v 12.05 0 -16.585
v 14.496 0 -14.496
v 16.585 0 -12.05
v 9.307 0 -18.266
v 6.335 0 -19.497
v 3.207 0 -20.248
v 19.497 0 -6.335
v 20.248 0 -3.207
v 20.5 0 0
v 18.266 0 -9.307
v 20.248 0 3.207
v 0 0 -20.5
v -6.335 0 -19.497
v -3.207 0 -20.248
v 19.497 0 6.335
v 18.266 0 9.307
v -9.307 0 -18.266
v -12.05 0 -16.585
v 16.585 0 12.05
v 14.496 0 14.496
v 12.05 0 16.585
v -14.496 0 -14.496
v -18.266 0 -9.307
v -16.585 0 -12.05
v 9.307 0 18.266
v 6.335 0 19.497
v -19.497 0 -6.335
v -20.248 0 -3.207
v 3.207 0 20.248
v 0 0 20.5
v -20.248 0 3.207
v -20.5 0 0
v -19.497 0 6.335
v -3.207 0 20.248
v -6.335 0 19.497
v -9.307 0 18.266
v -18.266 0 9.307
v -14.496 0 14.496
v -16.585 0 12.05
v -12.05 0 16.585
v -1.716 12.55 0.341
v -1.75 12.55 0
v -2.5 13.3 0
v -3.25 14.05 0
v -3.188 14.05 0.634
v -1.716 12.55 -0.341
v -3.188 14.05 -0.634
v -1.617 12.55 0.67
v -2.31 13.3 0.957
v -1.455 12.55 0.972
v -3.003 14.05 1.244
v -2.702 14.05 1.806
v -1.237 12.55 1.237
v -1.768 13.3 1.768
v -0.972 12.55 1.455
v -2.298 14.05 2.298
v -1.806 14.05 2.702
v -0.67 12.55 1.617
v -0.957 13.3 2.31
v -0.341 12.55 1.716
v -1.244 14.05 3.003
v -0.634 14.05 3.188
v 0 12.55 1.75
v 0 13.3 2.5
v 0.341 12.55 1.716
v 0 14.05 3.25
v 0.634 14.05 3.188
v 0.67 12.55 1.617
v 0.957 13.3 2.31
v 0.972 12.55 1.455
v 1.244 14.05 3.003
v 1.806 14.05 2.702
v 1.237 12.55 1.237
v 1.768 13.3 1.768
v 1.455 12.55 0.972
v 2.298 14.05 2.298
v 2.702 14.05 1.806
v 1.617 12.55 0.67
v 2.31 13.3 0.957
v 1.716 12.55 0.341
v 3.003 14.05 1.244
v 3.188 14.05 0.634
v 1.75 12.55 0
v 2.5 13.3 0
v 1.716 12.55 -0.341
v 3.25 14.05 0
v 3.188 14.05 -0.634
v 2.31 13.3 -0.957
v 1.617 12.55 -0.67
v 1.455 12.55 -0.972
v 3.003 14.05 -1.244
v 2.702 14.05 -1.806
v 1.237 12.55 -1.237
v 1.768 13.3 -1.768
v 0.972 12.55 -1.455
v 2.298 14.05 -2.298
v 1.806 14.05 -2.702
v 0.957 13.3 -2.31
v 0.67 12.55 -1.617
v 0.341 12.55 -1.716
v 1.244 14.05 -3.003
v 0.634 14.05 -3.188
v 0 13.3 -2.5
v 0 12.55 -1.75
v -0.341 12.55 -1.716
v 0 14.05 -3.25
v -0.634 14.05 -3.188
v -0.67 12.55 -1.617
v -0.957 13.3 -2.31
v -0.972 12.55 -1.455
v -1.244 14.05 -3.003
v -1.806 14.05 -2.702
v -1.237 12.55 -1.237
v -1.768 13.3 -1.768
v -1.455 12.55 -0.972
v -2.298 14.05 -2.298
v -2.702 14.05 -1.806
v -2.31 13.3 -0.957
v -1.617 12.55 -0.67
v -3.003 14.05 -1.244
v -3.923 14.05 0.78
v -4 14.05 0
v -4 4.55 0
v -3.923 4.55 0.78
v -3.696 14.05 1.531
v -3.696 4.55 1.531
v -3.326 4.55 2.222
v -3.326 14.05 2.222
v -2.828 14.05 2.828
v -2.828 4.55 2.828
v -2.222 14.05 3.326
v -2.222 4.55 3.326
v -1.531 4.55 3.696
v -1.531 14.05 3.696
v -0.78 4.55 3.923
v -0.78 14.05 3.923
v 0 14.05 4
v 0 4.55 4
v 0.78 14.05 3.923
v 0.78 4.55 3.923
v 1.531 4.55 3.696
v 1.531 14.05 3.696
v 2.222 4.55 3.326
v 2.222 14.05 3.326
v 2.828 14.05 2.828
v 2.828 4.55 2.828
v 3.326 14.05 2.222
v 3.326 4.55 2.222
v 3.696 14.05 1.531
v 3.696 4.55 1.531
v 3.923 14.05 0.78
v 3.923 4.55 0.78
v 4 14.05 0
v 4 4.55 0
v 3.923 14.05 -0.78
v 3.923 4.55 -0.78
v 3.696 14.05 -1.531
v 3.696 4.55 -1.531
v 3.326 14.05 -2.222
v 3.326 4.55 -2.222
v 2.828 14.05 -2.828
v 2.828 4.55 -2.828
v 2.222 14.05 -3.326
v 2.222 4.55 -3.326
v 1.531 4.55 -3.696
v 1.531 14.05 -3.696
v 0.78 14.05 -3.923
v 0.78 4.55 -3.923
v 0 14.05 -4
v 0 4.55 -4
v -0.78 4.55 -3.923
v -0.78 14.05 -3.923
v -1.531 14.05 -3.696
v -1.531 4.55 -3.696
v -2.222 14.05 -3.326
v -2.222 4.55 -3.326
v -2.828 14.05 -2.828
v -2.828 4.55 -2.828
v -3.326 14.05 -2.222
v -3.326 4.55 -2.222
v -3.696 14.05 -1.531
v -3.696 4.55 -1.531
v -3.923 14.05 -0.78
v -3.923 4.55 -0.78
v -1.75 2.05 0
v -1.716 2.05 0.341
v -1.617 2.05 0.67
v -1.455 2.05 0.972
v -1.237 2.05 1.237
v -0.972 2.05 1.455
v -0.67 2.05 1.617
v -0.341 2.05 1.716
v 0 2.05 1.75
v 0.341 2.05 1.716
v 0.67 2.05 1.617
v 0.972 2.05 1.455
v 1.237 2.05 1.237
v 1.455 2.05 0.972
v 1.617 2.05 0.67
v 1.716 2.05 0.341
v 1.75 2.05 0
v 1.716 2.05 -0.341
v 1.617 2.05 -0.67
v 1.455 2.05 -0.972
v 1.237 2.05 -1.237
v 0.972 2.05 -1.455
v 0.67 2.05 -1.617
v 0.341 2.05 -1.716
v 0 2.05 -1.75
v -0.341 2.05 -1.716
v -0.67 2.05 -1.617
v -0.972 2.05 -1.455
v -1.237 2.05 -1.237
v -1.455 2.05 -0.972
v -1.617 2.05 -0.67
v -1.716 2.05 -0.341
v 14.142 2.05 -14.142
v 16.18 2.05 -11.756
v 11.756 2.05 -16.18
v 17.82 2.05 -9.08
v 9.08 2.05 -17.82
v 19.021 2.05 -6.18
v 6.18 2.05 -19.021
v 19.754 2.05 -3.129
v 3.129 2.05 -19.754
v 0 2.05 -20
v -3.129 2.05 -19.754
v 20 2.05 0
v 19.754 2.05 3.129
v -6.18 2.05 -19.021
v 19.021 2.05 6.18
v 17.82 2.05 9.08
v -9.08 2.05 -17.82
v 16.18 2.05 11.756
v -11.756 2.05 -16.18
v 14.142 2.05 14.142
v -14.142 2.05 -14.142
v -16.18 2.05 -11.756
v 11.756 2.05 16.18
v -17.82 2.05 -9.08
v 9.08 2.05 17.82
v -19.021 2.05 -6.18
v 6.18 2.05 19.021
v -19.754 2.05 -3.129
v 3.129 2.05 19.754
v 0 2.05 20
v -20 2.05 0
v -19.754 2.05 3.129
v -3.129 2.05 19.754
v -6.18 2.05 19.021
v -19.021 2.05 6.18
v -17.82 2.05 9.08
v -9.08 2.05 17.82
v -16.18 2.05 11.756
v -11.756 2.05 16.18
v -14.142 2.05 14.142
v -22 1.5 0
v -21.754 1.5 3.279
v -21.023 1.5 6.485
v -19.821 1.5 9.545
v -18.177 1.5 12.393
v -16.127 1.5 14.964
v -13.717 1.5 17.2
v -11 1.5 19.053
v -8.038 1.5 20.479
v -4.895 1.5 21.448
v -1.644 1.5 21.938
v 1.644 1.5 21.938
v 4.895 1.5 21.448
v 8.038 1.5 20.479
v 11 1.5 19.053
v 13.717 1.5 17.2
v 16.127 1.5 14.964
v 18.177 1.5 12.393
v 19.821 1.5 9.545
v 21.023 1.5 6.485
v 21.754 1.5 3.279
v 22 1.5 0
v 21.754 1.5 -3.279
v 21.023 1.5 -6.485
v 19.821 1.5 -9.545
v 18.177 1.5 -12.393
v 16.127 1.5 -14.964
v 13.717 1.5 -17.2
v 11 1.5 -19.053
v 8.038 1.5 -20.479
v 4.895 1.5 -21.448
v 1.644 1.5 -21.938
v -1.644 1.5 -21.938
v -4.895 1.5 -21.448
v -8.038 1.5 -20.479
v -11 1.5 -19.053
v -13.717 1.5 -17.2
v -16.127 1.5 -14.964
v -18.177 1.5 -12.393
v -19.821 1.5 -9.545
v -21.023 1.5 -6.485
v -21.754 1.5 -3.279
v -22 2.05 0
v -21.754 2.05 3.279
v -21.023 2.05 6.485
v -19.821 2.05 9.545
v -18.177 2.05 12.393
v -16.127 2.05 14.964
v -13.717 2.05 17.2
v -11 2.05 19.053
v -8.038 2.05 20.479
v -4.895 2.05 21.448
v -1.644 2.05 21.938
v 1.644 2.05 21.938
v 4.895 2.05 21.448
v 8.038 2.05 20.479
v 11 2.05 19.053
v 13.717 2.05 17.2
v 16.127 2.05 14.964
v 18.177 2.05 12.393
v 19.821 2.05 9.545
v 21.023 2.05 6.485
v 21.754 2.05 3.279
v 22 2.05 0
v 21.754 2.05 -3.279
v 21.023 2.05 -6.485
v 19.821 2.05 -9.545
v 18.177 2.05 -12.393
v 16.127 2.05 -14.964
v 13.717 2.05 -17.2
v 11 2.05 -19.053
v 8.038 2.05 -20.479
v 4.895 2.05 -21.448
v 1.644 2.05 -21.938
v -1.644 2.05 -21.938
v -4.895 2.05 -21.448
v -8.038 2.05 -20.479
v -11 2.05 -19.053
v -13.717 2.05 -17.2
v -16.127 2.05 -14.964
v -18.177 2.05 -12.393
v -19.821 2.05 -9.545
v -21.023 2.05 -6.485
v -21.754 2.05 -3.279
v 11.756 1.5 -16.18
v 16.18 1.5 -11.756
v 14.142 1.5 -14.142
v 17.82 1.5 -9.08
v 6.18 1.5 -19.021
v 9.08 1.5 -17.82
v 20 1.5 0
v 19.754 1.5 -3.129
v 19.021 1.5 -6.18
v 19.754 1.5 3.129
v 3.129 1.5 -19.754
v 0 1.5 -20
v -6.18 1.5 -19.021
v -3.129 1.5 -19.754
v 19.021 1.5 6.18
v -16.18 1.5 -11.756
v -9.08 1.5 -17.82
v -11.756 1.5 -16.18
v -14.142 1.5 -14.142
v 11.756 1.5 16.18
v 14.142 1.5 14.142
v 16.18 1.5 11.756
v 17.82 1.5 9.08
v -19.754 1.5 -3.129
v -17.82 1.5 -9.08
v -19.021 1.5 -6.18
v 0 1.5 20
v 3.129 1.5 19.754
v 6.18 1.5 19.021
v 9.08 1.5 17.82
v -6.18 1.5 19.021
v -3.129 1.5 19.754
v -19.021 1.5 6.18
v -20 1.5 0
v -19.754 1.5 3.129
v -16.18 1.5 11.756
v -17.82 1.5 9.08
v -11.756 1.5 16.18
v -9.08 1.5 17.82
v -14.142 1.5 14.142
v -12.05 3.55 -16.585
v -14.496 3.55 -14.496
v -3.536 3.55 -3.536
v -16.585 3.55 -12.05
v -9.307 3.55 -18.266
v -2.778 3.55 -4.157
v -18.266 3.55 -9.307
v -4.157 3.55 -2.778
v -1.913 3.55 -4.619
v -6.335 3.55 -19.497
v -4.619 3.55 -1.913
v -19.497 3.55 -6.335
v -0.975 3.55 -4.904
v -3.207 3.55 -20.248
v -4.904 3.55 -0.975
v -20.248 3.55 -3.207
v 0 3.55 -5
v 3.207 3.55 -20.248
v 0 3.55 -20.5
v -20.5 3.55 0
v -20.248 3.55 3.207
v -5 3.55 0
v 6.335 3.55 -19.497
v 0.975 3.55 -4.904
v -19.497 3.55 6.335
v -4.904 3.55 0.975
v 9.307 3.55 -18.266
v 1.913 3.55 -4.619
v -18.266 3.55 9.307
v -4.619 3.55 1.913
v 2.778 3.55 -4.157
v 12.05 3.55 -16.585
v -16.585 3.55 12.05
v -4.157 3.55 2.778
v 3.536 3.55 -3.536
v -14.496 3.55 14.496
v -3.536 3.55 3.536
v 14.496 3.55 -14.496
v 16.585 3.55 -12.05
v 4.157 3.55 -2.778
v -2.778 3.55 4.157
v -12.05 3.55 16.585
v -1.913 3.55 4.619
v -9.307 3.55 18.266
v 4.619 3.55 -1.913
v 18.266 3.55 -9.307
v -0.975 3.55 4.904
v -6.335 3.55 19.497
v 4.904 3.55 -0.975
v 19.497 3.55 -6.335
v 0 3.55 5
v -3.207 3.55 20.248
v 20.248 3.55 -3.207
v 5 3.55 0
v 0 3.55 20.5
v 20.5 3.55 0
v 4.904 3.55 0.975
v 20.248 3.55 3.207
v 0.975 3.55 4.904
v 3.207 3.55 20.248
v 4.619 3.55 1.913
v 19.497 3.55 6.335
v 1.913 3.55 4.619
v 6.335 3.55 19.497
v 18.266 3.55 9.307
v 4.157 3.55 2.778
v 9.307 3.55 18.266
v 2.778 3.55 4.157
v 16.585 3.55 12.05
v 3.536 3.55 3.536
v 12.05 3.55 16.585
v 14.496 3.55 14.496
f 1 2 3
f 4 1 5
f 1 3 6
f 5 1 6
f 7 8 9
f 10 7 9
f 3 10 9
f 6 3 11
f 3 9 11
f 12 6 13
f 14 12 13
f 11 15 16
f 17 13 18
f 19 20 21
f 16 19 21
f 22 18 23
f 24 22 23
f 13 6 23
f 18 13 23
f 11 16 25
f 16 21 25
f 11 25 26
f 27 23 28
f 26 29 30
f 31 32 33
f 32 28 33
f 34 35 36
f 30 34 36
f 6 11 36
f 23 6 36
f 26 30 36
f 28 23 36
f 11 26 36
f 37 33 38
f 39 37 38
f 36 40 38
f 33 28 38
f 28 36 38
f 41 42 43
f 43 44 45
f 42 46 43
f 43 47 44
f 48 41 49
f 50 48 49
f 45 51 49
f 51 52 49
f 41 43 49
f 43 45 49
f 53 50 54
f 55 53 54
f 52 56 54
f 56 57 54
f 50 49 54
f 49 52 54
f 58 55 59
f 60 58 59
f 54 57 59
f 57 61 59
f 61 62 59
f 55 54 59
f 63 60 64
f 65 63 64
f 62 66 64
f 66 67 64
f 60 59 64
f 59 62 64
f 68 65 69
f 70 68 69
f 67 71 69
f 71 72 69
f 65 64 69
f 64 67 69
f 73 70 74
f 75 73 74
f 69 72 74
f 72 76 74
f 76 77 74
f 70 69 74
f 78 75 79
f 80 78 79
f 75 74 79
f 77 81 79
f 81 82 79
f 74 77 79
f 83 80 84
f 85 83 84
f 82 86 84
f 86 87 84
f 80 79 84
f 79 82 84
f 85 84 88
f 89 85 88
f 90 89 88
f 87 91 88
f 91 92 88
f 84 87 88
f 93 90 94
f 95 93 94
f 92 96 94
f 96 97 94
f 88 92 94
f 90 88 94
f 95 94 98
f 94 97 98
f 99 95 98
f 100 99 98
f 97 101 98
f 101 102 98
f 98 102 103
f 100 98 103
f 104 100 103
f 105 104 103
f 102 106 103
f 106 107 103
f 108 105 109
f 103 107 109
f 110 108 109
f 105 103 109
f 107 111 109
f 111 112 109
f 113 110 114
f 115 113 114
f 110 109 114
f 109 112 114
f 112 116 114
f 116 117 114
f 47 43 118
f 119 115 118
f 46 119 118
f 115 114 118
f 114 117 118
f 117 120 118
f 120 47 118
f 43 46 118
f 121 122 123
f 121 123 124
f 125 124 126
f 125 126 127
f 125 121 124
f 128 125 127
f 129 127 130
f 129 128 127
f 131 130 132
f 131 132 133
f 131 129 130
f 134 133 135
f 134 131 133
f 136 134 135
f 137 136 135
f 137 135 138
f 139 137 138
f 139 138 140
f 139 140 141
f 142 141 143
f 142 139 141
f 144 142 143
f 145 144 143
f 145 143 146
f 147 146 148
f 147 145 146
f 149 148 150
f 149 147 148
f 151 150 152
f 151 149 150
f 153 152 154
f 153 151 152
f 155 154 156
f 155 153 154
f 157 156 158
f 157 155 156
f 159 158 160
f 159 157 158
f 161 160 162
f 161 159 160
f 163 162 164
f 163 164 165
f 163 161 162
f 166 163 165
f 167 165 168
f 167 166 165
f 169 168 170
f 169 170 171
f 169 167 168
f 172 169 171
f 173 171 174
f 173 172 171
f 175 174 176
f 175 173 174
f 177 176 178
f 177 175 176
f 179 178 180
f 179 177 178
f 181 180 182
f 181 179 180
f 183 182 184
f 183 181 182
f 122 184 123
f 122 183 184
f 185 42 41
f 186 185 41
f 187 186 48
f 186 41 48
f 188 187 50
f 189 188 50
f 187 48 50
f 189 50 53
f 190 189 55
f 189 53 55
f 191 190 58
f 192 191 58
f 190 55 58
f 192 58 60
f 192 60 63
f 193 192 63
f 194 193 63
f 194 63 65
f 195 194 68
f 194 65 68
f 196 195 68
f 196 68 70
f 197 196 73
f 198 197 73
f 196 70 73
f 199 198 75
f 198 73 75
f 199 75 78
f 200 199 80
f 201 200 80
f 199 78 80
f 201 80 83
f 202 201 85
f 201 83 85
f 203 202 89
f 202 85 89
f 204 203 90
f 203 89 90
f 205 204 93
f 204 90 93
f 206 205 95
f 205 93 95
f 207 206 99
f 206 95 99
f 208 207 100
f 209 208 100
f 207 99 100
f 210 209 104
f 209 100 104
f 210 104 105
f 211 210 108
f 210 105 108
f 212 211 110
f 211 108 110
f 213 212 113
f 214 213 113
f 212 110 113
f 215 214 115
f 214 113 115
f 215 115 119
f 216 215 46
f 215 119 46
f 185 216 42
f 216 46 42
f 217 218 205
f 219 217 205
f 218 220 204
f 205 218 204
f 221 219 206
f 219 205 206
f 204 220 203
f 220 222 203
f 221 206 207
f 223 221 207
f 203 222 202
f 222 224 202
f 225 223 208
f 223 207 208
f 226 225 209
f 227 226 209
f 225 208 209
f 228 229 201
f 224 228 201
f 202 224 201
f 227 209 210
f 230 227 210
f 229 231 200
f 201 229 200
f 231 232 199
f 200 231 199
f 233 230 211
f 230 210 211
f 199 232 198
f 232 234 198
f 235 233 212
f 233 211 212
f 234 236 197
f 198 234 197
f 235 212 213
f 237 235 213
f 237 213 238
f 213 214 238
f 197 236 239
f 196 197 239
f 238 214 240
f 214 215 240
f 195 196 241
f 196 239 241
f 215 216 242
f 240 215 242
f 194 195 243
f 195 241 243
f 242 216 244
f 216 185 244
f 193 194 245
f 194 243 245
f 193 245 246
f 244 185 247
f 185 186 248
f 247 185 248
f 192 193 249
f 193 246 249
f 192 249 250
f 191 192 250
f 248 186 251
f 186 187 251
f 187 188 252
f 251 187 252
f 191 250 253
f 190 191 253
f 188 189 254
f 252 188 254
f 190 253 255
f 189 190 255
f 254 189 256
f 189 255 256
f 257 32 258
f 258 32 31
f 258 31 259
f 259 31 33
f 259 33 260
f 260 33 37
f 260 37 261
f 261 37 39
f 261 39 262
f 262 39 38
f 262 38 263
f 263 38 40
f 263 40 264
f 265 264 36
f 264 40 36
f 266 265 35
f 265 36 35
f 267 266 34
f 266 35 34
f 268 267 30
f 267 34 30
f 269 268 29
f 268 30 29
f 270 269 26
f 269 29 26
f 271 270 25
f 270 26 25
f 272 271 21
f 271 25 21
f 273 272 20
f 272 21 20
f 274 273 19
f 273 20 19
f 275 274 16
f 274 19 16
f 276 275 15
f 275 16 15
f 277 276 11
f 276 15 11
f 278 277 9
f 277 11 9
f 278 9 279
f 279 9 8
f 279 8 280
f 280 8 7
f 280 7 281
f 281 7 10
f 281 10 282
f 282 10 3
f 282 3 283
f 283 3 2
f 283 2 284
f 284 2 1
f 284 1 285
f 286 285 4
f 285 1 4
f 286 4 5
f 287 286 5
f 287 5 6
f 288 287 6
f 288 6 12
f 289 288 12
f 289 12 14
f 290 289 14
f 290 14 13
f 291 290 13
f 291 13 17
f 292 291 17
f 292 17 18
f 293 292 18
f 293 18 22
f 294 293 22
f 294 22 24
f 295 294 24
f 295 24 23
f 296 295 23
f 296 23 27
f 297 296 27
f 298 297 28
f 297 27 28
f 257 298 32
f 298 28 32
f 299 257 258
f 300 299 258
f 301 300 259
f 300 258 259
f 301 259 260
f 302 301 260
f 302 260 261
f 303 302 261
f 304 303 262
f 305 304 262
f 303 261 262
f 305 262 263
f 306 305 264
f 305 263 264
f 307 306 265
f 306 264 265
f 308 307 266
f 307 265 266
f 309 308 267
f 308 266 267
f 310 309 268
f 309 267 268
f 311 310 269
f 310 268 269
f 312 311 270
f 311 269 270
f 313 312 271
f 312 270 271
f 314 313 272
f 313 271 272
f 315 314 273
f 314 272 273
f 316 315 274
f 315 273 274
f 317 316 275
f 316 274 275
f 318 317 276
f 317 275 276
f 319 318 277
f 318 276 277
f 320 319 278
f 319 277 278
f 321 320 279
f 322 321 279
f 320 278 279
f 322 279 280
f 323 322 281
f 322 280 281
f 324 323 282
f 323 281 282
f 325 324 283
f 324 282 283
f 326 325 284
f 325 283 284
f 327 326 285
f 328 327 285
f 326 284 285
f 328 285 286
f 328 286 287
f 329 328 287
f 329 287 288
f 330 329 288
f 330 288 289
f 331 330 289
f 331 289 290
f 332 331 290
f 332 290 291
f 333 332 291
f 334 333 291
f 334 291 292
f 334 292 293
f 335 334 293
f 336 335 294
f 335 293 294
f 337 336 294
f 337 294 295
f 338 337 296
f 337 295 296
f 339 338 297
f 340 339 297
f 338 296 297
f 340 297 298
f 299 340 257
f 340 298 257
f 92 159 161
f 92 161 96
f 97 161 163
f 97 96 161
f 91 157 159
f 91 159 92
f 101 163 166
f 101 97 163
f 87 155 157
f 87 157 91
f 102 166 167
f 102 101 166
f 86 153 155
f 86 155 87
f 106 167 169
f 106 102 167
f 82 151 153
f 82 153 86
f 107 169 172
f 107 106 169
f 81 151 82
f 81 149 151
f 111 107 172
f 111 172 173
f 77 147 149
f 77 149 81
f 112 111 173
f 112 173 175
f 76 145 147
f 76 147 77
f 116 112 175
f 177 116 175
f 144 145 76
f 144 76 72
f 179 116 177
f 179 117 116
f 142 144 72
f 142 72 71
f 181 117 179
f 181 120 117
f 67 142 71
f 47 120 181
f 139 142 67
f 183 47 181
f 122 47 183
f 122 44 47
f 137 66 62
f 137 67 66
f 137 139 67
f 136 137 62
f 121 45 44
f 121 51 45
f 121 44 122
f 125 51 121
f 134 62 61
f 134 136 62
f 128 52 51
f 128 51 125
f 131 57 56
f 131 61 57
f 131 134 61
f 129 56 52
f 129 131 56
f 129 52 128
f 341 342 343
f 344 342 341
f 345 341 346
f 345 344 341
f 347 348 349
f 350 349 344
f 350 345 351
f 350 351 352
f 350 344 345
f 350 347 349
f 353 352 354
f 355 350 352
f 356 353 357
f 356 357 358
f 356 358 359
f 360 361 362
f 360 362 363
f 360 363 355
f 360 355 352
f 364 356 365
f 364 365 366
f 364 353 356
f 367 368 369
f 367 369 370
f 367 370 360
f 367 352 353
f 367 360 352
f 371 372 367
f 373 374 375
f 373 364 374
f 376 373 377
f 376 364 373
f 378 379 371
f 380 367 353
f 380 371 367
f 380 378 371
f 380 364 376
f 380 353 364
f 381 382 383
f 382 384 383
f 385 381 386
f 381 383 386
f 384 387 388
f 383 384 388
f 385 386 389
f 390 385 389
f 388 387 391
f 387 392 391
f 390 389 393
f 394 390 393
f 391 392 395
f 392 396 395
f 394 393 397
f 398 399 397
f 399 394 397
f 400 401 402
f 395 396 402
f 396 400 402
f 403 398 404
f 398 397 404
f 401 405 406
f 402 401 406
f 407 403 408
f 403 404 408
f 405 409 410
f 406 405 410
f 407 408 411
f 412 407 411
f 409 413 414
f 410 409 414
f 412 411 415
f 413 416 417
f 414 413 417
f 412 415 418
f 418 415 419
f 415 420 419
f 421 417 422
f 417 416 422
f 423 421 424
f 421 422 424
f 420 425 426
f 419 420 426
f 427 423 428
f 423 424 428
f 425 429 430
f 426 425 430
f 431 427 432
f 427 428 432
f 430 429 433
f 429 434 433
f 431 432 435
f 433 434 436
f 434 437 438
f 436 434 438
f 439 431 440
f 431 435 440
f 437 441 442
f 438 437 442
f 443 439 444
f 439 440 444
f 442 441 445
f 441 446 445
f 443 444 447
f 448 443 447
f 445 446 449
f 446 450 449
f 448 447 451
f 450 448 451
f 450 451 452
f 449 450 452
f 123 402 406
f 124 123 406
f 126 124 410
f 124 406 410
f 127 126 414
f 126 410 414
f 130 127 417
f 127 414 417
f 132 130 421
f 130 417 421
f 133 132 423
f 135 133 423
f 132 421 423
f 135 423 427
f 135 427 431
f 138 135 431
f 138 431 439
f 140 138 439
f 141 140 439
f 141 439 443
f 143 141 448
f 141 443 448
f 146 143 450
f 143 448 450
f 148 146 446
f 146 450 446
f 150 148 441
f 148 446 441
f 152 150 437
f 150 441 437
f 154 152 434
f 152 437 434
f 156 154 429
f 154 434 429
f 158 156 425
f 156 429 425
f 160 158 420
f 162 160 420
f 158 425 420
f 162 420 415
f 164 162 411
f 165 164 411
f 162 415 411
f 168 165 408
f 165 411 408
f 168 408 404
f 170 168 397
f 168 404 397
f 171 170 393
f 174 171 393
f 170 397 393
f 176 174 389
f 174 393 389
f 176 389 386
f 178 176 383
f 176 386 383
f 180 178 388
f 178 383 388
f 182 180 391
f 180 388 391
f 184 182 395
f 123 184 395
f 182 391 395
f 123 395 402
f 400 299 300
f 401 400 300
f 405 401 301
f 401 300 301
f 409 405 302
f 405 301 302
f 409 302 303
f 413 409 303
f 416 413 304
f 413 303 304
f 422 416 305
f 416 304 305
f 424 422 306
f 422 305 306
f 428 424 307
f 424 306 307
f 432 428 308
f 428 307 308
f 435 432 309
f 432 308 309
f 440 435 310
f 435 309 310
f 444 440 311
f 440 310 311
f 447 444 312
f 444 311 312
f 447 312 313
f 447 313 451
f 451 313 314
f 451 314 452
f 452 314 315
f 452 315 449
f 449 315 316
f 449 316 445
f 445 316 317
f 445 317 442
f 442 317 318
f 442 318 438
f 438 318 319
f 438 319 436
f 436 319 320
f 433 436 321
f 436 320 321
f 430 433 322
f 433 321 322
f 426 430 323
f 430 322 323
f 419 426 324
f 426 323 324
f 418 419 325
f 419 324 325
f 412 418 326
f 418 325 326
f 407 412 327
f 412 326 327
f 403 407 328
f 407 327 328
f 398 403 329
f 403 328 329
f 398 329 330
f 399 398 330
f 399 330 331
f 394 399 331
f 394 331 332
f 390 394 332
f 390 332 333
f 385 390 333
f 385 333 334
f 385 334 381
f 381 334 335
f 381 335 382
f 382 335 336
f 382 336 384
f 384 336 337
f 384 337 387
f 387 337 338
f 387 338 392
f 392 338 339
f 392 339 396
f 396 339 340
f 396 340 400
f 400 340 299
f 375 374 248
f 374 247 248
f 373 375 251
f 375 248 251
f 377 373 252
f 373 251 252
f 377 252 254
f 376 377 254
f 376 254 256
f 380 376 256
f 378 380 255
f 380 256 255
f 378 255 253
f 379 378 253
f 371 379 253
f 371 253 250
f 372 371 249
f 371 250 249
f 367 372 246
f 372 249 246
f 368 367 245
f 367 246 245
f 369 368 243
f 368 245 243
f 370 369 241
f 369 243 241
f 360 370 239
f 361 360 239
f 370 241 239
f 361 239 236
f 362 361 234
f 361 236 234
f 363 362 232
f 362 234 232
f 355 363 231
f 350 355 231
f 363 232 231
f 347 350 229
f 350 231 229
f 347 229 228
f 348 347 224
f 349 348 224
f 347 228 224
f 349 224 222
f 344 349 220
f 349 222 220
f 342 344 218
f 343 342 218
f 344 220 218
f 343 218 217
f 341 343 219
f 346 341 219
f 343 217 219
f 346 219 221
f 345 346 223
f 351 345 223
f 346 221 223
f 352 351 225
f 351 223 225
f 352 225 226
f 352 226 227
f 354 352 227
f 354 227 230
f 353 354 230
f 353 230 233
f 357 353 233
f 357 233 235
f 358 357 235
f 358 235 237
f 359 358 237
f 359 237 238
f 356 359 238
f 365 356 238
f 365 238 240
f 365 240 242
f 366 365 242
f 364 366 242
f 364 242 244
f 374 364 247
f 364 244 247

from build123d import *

# Parameters (mm, degrees)
SKETCH1_W     = 2.25
SKETCH1_H     = 10.5
SKETCH1_W_2   = 20
SKETCH1_H_2   = 1.5
CHAMFER1_SIZE = 1.5
CHAMFER2_SIZE = 1


with BuildPart() as part:
    # Sketch1 → Revolve1 (revolve)
    with BuildSketch(Plane.XY):
        Polygon((-20, 3.55), (-20, 2.05), (-1.75, 2.05), (-1.75, 3.55), (-4, 3.55), align=None)
        Polygon((-22, 0), (-20, 0), (-20, 1.5), (-20, 2.05), (-20, 3.55), (-22, 3.55), align=None)
        with Locations((-2.875, 8.8)):
            Rectangle(SKETCH1_W, SKETCH1_H)
        with Locations((-10, 0.75)):
            Rectangle(SKETCH1_W_2, SKETCH1_H_2)
    revolve(axis=Axis((0, 0, 0), (0, 1, 0)))

    # Chamfer1
    chamfer1_edges = [part.edges().sort_by_distance(p)[0] for p in [
        (22, 0, 0),
        (22, 3.55, 0),
        (1.75, 14.05, 0),
    ]]
    chamfer(chamfer1_edges, length=CHAMFER1_SIZE)

    # Chamfer2
    chamfer2_edges = [part.edges().sort_by_distance(p)[0] for p in [
        (4, 3.55, 0),
    ]]
    chamfer(chamfer2_edges, length=CHAMFER2_SIZE)


solid = part.part
